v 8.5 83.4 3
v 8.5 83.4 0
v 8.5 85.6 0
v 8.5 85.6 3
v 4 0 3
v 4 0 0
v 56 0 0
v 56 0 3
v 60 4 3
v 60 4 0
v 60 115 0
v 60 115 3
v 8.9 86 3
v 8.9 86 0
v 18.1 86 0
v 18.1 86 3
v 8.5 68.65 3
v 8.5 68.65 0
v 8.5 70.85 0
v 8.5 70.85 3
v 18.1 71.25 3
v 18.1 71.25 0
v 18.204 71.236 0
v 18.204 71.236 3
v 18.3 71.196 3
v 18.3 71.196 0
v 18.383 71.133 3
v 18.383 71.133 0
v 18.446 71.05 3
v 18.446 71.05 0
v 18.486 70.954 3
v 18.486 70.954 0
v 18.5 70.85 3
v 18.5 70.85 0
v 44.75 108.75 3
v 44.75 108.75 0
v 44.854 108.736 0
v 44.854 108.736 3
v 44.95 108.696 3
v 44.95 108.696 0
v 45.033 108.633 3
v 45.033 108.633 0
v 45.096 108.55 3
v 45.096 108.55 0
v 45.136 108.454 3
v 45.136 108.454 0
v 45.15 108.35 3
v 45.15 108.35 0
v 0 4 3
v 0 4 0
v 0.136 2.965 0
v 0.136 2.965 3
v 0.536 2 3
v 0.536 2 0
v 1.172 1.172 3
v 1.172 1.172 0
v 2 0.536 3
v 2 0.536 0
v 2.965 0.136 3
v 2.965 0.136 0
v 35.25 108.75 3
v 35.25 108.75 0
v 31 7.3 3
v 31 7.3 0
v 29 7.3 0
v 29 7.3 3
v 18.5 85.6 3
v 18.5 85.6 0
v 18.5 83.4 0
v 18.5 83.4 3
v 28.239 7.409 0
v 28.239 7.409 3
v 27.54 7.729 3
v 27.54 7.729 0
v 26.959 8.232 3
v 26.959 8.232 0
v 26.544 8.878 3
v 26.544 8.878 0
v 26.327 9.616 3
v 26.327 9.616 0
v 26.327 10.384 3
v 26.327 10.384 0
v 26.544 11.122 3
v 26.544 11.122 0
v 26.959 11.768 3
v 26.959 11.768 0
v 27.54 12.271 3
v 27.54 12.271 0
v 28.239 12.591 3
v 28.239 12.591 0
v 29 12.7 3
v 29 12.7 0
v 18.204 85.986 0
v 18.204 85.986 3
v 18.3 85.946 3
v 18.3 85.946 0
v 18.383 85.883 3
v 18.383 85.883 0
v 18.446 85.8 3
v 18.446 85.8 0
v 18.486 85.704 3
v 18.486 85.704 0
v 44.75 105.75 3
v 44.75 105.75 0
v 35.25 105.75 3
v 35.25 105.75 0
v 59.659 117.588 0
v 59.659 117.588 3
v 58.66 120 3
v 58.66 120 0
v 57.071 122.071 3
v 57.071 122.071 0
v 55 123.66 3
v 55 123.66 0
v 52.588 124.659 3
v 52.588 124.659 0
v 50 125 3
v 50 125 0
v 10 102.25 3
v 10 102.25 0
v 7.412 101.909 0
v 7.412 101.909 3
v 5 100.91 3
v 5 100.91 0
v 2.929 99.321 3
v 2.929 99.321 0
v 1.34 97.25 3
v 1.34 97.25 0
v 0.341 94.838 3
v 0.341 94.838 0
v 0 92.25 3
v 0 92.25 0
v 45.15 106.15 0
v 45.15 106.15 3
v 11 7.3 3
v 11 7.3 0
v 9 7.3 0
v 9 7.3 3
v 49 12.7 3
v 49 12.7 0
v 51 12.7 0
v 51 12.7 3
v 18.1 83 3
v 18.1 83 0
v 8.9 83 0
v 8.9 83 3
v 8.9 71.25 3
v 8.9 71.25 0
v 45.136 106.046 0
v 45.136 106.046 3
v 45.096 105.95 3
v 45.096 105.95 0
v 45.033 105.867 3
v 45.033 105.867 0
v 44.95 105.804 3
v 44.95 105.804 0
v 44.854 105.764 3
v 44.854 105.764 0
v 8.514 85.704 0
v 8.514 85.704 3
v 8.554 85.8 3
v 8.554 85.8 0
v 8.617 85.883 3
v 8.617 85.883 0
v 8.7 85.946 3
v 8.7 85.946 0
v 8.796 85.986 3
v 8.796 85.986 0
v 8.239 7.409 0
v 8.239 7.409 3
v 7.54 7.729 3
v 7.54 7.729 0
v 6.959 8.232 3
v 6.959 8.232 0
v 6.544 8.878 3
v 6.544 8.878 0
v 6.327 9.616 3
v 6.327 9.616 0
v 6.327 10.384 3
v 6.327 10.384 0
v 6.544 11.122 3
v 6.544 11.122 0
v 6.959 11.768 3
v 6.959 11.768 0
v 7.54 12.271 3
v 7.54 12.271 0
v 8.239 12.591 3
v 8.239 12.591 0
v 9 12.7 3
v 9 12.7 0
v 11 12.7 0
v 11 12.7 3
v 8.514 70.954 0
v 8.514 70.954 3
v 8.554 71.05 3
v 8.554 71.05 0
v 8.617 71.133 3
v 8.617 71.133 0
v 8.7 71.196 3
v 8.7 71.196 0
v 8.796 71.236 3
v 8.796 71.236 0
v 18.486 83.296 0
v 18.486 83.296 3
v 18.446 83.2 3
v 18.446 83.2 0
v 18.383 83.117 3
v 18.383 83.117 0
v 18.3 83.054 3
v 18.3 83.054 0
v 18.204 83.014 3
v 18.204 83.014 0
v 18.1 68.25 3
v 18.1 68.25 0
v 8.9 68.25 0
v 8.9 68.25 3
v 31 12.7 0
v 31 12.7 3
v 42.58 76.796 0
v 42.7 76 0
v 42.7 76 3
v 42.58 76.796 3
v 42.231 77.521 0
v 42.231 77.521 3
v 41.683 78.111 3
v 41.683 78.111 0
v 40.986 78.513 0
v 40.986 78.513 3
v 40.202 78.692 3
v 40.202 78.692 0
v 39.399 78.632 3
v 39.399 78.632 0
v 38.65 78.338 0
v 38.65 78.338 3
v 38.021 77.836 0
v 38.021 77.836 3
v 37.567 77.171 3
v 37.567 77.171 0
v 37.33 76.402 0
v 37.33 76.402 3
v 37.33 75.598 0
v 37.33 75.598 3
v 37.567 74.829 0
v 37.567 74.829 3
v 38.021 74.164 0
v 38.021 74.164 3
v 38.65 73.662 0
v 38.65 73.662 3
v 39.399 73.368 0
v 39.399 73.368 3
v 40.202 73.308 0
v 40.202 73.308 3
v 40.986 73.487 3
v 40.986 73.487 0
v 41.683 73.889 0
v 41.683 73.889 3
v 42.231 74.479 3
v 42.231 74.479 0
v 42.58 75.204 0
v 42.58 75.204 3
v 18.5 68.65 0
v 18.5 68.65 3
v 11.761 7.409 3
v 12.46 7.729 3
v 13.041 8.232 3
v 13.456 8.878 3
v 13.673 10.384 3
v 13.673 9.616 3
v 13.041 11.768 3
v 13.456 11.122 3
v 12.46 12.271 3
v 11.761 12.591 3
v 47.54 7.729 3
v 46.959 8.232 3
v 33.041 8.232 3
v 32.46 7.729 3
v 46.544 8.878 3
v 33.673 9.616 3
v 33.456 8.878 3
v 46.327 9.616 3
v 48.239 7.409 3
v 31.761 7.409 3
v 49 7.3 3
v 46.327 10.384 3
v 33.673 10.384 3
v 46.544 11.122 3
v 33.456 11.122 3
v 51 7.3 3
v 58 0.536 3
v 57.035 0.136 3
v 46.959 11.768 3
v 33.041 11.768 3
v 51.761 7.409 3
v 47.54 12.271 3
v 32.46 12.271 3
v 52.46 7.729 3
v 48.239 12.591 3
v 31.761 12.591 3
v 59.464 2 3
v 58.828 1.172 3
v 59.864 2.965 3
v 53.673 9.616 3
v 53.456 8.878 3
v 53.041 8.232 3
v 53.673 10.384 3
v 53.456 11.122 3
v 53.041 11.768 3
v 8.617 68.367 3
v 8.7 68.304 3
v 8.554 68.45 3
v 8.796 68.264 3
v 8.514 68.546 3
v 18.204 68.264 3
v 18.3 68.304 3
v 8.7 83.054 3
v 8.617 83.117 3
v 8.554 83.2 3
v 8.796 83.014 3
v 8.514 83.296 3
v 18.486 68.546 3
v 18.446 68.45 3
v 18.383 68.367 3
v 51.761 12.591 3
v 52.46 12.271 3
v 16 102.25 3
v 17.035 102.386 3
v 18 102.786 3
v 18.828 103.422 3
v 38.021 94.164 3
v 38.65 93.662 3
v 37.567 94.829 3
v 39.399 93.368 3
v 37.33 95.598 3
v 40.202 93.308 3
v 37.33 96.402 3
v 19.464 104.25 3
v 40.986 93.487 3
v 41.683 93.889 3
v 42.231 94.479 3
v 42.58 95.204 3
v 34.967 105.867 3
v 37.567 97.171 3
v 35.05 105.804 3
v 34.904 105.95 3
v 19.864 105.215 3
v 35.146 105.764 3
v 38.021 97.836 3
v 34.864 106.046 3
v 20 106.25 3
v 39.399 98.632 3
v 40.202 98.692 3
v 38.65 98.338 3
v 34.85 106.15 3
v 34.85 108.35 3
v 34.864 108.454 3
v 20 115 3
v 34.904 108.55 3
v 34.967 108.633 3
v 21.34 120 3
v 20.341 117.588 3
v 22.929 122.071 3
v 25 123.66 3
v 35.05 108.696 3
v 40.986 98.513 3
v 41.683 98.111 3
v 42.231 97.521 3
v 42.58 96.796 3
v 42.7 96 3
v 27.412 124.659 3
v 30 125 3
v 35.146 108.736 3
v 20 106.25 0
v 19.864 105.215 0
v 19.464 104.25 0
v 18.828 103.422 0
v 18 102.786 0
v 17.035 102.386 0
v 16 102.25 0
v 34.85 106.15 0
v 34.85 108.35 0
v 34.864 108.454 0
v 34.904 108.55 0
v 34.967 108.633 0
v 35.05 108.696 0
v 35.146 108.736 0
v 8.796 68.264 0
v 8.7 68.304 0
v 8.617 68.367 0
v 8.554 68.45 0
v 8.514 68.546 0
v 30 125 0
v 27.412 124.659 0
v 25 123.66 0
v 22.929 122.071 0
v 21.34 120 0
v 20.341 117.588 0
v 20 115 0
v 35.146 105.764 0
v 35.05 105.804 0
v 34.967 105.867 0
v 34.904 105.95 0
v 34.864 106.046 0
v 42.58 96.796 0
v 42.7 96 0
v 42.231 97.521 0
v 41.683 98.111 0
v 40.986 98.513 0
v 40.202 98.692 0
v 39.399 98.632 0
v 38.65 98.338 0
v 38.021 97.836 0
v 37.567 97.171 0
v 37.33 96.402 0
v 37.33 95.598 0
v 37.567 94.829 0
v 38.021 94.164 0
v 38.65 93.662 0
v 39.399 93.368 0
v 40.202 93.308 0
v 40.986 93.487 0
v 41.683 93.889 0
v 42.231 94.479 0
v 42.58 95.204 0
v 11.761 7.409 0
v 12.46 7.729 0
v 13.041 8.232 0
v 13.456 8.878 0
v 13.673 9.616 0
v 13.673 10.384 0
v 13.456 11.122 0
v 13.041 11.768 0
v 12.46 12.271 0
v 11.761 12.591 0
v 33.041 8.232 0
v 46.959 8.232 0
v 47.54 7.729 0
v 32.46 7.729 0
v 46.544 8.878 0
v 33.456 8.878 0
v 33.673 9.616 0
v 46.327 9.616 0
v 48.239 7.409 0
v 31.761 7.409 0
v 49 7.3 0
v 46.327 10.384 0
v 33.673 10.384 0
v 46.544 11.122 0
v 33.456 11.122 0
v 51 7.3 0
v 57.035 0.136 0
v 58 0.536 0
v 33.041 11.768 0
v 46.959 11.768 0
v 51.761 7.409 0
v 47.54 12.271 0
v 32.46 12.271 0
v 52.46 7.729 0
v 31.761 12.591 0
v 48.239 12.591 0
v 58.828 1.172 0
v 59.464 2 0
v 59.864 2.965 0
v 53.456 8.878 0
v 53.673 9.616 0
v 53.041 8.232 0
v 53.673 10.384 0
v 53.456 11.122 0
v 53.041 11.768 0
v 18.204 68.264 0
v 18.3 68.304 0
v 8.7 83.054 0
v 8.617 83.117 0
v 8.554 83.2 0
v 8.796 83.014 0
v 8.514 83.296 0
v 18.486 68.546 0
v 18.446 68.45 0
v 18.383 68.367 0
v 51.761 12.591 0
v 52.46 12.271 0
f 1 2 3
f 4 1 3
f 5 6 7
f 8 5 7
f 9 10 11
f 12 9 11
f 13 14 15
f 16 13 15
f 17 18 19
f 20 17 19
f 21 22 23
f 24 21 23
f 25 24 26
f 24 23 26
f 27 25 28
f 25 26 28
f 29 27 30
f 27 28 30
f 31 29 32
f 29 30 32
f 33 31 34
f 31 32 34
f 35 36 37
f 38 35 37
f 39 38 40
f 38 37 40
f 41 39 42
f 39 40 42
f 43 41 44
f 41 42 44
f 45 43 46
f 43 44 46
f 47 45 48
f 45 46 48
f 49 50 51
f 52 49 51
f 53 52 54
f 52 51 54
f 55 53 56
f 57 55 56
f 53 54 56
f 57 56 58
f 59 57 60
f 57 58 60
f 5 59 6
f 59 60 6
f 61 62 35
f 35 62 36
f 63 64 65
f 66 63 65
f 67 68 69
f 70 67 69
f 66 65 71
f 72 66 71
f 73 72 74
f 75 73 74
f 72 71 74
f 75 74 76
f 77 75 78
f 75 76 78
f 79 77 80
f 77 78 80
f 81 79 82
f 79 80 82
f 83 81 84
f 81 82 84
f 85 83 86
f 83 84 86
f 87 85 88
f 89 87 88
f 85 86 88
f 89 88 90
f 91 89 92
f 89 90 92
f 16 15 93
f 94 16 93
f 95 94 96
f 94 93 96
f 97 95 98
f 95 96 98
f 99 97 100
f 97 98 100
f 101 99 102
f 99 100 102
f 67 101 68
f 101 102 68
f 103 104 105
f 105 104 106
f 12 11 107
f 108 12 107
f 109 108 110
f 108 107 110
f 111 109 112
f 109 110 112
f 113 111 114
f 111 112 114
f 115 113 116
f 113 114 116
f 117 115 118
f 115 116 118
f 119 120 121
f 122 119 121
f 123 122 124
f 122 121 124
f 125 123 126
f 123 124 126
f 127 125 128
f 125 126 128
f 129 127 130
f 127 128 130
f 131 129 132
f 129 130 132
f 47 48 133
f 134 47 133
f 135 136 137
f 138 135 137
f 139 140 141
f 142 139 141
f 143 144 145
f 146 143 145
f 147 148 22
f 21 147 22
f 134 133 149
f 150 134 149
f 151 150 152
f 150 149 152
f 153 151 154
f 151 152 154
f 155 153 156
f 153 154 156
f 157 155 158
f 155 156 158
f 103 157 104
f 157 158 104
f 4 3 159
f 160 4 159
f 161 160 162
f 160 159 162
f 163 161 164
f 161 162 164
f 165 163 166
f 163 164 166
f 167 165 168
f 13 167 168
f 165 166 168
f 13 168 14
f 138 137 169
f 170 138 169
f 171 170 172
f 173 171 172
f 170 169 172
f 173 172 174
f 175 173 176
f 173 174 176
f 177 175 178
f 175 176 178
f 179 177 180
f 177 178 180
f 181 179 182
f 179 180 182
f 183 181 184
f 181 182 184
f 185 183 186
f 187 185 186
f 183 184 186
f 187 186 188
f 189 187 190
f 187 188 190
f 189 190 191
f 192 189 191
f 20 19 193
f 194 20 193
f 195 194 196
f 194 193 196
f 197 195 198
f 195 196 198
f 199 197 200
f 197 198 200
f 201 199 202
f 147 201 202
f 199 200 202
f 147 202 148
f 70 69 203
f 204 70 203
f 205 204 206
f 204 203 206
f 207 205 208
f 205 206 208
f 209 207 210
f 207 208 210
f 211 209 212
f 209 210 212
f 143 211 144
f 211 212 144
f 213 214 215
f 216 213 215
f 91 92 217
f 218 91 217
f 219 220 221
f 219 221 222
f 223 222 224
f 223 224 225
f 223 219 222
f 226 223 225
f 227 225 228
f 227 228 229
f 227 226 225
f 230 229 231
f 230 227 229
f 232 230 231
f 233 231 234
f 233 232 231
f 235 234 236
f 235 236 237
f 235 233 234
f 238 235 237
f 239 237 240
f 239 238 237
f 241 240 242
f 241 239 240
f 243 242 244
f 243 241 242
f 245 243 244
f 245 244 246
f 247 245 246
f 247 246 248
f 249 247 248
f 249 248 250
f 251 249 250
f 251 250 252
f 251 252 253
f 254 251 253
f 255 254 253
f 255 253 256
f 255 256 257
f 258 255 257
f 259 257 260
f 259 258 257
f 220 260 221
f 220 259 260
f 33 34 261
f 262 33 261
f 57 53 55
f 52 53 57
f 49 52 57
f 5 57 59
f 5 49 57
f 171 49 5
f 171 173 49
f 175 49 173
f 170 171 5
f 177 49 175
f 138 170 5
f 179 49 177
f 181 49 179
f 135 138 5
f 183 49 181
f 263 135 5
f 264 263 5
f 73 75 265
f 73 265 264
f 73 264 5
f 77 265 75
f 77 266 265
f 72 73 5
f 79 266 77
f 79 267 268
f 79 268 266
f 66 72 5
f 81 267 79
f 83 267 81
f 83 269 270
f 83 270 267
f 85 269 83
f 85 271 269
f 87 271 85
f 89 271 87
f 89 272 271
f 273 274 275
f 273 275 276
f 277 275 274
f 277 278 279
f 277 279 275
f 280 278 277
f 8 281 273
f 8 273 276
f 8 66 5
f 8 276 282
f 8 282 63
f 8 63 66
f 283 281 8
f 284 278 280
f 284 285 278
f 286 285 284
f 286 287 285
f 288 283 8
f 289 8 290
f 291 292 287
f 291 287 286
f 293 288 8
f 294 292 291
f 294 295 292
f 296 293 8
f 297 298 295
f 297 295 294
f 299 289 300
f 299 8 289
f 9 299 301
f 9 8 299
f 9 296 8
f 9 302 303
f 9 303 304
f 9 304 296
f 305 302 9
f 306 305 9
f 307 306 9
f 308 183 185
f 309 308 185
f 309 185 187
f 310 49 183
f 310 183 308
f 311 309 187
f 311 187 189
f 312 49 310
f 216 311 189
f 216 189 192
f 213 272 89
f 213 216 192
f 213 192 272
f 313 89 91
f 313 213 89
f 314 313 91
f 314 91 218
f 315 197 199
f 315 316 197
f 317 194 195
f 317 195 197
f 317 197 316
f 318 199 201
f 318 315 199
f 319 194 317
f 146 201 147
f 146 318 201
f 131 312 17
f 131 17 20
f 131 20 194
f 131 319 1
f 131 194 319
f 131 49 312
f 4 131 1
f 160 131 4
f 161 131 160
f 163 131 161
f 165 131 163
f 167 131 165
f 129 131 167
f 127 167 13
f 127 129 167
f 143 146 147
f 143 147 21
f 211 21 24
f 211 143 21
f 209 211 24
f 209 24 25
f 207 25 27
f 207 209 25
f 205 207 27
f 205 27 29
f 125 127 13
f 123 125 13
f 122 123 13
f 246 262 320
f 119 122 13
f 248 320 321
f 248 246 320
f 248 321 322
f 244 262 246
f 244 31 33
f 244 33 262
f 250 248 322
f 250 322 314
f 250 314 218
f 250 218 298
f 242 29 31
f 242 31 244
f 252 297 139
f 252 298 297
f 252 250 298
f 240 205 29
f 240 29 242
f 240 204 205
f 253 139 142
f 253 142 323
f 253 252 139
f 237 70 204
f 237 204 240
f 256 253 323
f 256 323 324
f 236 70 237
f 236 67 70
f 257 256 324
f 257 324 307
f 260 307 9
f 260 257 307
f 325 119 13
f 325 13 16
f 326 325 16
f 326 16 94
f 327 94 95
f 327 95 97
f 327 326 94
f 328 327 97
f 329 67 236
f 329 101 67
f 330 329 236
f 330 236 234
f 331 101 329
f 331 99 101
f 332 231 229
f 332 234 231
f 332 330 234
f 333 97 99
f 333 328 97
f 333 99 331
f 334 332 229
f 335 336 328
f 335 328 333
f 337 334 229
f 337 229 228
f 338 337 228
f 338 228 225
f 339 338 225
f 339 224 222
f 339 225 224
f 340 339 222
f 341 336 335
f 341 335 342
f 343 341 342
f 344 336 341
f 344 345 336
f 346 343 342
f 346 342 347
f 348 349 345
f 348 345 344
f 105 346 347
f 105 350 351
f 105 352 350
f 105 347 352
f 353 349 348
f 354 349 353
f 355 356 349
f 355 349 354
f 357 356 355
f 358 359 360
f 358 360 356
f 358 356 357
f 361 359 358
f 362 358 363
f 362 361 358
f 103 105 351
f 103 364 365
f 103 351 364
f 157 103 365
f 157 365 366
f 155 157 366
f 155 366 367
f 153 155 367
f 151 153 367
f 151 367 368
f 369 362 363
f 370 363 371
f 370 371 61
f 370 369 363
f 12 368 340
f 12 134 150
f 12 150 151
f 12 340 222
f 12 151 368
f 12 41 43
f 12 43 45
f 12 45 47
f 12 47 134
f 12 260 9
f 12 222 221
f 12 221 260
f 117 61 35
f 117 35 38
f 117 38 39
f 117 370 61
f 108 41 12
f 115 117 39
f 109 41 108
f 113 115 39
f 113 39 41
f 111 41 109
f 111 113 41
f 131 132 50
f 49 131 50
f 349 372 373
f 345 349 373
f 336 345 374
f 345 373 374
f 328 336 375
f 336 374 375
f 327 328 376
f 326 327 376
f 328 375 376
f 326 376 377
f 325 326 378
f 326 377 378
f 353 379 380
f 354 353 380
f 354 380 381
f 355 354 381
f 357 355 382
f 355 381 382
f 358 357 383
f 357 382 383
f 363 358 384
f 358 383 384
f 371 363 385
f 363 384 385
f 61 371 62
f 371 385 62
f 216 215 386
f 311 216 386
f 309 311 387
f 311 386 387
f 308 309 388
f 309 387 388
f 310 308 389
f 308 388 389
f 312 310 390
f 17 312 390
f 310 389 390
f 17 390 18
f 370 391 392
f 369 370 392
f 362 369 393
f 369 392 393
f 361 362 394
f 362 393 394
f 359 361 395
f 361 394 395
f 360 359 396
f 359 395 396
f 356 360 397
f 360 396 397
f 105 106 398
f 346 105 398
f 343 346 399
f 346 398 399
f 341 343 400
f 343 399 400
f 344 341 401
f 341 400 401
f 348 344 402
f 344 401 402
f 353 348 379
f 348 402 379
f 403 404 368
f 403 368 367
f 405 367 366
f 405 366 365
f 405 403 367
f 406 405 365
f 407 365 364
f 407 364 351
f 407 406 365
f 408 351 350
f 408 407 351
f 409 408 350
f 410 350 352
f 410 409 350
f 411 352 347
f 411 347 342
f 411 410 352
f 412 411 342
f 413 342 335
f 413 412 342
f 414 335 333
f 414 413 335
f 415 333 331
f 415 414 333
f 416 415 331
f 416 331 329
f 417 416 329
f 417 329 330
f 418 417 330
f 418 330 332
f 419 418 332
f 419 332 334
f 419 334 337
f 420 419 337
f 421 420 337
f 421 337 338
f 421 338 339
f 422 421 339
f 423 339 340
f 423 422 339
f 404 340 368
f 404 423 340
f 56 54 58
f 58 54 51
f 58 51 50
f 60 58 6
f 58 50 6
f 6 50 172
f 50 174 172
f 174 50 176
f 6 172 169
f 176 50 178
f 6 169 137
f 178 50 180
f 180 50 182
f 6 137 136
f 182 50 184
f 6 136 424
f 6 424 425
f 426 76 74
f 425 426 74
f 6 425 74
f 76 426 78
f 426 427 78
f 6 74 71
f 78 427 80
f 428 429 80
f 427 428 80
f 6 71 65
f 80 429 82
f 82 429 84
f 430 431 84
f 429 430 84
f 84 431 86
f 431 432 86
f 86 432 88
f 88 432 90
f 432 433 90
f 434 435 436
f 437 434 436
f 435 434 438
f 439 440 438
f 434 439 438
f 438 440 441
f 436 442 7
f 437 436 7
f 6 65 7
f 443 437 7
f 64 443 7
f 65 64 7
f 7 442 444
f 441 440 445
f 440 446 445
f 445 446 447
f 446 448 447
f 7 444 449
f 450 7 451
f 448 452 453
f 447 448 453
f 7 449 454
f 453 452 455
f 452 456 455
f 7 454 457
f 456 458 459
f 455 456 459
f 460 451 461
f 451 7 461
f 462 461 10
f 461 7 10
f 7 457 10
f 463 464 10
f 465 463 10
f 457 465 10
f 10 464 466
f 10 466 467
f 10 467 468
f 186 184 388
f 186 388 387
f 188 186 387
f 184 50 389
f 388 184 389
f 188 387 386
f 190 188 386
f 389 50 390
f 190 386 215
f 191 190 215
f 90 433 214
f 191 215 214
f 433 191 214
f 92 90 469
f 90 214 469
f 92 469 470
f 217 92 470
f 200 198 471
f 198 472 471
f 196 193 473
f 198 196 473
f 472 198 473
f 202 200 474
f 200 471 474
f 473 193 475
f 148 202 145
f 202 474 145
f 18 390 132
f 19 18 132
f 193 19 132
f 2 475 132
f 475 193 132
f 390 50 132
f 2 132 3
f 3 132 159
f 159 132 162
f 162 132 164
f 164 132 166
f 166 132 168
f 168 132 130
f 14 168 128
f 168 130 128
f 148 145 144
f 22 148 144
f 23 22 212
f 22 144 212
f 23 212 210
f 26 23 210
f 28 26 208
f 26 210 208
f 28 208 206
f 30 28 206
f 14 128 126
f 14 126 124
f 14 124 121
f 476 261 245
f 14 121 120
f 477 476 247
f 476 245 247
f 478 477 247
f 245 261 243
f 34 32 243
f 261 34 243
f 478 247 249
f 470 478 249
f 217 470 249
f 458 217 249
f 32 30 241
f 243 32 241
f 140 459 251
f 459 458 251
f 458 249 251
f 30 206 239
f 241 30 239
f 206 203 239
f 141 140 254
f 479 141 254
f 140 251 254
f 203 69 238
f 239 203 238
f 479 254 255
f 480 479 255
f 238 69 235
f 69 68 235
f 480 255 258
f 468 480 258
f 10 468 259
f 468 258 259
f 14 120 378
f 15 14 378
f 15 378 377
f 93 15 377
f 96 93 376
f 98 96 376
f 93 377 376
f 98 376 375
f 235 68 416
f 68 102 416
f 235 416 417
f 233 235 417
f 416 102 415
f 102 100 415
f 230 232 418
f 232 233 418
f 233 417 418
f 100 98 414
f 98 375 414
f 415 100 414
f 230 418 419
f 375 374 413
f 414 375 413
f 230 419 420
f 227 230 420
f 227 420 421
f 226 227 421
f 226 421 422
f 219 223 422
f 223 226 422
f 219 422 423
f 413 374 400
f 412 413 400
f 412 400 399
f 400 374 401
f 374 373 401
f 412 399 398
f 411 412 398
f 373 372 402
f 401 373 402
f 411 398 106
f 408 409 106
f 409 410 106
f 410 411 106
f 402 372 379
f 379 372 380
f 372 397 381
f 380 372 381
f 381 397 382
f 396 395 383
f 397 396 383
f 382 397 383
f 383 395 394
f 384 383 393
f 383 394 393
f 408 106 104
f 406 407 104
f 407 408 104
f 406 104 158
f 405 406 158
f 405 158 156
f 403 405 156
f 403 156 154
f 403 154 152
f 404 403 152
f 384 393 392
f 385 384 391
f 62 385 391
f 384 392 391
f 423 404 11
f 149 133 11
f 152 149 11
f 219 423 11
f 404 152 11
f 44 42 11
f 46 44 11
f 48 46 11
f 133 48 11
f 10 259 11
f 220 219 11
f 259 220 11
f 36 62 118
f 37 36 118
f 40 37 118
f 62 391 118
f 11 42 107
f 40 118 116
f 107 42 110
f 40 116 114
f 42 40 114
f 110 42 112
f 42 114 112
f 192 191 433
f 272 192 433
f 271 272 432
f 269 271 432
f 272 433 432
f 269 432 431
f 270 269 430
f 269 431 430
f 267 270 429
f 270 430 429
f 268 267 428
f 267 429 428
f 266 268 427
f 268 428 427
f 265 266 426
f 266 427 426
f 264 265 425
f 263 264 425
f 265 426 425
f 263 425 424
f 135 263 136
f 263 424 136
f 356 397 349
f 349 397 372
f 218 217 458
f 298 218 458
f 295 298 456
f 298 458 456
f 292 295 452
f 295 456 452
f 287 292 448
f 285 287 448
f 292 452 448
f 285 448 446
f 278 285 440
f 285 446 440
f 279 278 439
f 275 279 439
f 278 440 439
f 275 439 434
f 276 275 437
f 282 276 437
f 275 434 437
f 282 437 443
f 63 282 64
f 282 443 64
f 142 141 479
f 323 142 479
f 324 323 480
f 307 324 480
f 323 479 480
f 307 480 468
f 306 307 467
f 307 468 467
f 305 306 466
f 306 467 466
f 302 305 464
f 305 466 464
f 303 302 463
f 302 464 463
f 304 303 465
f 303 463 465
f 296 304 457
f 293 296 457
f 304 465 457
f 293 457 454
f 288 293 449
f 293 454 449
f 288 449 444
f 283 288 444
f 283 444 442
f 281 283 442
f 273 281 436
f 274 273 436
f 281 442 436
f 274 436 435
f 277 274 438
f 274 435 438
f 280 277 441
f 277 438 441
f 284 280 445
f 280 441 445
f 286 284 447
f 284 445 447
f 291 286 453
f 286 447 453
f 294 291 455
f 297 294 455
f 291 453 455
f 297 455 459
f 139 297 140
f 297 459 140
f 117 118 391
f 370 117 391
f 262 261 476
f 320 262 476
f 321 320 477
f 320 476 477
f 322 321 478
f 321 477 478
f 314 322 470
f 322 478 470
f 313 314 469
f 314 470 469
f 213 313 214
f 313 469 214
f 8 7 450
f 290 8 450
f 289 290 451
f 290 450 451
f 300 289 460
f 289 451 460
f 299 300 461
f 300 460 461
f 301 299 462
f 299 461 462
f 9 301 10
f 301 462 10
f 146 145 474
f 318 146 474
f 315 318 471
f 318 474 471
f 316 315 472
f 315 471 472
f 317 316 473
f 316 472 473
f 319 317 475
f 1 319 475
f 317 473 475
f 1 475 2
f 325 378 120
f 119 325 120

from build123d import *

# Parameters (mm, degrees)
MODEL_R                         = 2.7
AUFSATZ_LINEAR_AUSTRAGEN1_DEPTH = 3


with BuildPart() as part:
    # Model → Aufsatz-Linear austragen1 (new body)
    with BuildSketch(Plane.XY):
        with BuildLine():
            Line((16, 102.25), (10, 102.25))
            ThreePointArc((10, 102.25), (2.928932188, 99.321067812), (0, 92.25))
            Line((0, 92.25), (0, 4))
            ThreePointArc((0, 4), (1.171572875, 1.171572875), (4, 0))
            Line((4, 0), (56, 0))
            ThreePointArc((56, 0), (58.828427125, 1.171572875), (60, 4))
            Line((60, 4), (60, 115))
            ThreePointArc((60, 115), (57.071067812, 122.071067812), (50, 125))
            Line((50, 125), (30, 125))
            ThreePointArc((30, 125), (22.928932188, 122.071067812), (20, 115))
            Line((20, 115), (20, 106.25))
            ThreePointArc((20, 106.25), (18.828427125, 103.421572875), (16, 102.25))
        make_face()
        with Locations((40, 76)):
            Circle(MODEL_R, mode=Mode.SUBTRACT)
        with Locations((40, 96)):
            Circle(MODEL_R, mode=Mode.SUBTRACT)
        with BuildLine():
            Line((11, 7.3), (9, 7.3))
            ThreePointArc((9, 7.3), (6.3, 10), (9, 12.7))
            Line((9, 12.7), (11, 12.7))
            ThreePointArc((11, 12.7), (13.7, 10), (11, 7.3))
        make_face(mode=Mode.SUBTRACT)
        with BuildLine():
            Line((31, 7.3), (29, 7.3))
            ThreePointArc((29, 7.3), (26.3, 10), (29, 12.7))
            Line((29, 12.7), (31, 12.7))
            ThreePointArc((31, 12.7), (33.7, 10), (31, 7.3))
        make_face(mode=Mode.SUBTRACT)
        with BuildLine():
            Line((51, 7.3), (49, 7.3))
            ThreePointArc((49, 7.3), (46.3, 10), (49, 12.7))
            Line((49, 12.7), (51, 12.7))
            ThreePointArc((51, 12.7), (53.7, 10), (51, 7.3))
        make_face(mode=Mode.SUBTRACT)
        with BuildLine():
            Line((18.1, 83), (8.9, 83))
            ThreePointArc((8.9, 83), (8.617157288, 83.117157288), (8.5, 83.4))
            Line((8.5, 83.4), (8.5, 85.6))
            ThreePointArc((8.5, 85.6), (8.617157288, 85.882842712), (8.9, 86))
            Line((8.9, 86), (18.1, 86))
            ThreePointArc((18.1, 86), (18.382842712, 85.882842712), (18.5, 85.6))
            Line((18.5, 85.6), (18.5, 83.4))
            ThreePointArc((18.5, 83.4), (18.382842712, 83.117157288), (18.1, 83))
        make_face(mode=Mode.SUBTRACT)
        with BuildLine():
            Line((18.1, 68.25), (8.9, 68.25))
            ThreePointArc((8.9, 68.25), (8.617157288, 68.367157288), (8.5, 68.65))
            Line((8.5, 68.65), (8.5, 70.85))
            ThreePointArc((8.5, 70.85), (8.617157288, 71.132842712), (8.9, 71.25))
            Line((8.9, 71.25), (18.1, 71.25))
            ThreePointArc((18.1, 71.25), (18.382842712, 71.132842712), (18.5, 70.85))
            Line((18.5, 70.85), (18.5, 68.65))
            ThreePointArc((18.5, 68.65), (18.382842712, 68.367157288), (18.1, 68.25))
        make_face(mode=Mode.SUBTRACT)
        with BuildLine():
            Line((44.75, 105.75), (35.25, 105.75))
            ThreePointArc((35.25, 105.75), (34.967157288, 105.867157288), (34.85, 106.15))
            Line((34.85, 106.15), (34.85, 108.35))
            ThreePointArc((34.85, 108.35), (34.967157288, 108.632842712), (35.25, 108.75))
            Line((35.25, 108.75), (44.75, 108.75))
            ThreePointArc((44.75, 108.75), (45.032842712, 108.632842712), (45.15, 108.35))
            Line((45.15, 108.35), (45.15, 106.15))
            ThreePointArc((45.15, 106.15), (45.032842712, 105.867157288), (44.75, 105.75))
        make_face(mode=Mode.SUBTRACT)
    extrude(amount=AUFSATZ_LINEAR_AUSTRAGEN1_DEPTH)


solid = part.part
